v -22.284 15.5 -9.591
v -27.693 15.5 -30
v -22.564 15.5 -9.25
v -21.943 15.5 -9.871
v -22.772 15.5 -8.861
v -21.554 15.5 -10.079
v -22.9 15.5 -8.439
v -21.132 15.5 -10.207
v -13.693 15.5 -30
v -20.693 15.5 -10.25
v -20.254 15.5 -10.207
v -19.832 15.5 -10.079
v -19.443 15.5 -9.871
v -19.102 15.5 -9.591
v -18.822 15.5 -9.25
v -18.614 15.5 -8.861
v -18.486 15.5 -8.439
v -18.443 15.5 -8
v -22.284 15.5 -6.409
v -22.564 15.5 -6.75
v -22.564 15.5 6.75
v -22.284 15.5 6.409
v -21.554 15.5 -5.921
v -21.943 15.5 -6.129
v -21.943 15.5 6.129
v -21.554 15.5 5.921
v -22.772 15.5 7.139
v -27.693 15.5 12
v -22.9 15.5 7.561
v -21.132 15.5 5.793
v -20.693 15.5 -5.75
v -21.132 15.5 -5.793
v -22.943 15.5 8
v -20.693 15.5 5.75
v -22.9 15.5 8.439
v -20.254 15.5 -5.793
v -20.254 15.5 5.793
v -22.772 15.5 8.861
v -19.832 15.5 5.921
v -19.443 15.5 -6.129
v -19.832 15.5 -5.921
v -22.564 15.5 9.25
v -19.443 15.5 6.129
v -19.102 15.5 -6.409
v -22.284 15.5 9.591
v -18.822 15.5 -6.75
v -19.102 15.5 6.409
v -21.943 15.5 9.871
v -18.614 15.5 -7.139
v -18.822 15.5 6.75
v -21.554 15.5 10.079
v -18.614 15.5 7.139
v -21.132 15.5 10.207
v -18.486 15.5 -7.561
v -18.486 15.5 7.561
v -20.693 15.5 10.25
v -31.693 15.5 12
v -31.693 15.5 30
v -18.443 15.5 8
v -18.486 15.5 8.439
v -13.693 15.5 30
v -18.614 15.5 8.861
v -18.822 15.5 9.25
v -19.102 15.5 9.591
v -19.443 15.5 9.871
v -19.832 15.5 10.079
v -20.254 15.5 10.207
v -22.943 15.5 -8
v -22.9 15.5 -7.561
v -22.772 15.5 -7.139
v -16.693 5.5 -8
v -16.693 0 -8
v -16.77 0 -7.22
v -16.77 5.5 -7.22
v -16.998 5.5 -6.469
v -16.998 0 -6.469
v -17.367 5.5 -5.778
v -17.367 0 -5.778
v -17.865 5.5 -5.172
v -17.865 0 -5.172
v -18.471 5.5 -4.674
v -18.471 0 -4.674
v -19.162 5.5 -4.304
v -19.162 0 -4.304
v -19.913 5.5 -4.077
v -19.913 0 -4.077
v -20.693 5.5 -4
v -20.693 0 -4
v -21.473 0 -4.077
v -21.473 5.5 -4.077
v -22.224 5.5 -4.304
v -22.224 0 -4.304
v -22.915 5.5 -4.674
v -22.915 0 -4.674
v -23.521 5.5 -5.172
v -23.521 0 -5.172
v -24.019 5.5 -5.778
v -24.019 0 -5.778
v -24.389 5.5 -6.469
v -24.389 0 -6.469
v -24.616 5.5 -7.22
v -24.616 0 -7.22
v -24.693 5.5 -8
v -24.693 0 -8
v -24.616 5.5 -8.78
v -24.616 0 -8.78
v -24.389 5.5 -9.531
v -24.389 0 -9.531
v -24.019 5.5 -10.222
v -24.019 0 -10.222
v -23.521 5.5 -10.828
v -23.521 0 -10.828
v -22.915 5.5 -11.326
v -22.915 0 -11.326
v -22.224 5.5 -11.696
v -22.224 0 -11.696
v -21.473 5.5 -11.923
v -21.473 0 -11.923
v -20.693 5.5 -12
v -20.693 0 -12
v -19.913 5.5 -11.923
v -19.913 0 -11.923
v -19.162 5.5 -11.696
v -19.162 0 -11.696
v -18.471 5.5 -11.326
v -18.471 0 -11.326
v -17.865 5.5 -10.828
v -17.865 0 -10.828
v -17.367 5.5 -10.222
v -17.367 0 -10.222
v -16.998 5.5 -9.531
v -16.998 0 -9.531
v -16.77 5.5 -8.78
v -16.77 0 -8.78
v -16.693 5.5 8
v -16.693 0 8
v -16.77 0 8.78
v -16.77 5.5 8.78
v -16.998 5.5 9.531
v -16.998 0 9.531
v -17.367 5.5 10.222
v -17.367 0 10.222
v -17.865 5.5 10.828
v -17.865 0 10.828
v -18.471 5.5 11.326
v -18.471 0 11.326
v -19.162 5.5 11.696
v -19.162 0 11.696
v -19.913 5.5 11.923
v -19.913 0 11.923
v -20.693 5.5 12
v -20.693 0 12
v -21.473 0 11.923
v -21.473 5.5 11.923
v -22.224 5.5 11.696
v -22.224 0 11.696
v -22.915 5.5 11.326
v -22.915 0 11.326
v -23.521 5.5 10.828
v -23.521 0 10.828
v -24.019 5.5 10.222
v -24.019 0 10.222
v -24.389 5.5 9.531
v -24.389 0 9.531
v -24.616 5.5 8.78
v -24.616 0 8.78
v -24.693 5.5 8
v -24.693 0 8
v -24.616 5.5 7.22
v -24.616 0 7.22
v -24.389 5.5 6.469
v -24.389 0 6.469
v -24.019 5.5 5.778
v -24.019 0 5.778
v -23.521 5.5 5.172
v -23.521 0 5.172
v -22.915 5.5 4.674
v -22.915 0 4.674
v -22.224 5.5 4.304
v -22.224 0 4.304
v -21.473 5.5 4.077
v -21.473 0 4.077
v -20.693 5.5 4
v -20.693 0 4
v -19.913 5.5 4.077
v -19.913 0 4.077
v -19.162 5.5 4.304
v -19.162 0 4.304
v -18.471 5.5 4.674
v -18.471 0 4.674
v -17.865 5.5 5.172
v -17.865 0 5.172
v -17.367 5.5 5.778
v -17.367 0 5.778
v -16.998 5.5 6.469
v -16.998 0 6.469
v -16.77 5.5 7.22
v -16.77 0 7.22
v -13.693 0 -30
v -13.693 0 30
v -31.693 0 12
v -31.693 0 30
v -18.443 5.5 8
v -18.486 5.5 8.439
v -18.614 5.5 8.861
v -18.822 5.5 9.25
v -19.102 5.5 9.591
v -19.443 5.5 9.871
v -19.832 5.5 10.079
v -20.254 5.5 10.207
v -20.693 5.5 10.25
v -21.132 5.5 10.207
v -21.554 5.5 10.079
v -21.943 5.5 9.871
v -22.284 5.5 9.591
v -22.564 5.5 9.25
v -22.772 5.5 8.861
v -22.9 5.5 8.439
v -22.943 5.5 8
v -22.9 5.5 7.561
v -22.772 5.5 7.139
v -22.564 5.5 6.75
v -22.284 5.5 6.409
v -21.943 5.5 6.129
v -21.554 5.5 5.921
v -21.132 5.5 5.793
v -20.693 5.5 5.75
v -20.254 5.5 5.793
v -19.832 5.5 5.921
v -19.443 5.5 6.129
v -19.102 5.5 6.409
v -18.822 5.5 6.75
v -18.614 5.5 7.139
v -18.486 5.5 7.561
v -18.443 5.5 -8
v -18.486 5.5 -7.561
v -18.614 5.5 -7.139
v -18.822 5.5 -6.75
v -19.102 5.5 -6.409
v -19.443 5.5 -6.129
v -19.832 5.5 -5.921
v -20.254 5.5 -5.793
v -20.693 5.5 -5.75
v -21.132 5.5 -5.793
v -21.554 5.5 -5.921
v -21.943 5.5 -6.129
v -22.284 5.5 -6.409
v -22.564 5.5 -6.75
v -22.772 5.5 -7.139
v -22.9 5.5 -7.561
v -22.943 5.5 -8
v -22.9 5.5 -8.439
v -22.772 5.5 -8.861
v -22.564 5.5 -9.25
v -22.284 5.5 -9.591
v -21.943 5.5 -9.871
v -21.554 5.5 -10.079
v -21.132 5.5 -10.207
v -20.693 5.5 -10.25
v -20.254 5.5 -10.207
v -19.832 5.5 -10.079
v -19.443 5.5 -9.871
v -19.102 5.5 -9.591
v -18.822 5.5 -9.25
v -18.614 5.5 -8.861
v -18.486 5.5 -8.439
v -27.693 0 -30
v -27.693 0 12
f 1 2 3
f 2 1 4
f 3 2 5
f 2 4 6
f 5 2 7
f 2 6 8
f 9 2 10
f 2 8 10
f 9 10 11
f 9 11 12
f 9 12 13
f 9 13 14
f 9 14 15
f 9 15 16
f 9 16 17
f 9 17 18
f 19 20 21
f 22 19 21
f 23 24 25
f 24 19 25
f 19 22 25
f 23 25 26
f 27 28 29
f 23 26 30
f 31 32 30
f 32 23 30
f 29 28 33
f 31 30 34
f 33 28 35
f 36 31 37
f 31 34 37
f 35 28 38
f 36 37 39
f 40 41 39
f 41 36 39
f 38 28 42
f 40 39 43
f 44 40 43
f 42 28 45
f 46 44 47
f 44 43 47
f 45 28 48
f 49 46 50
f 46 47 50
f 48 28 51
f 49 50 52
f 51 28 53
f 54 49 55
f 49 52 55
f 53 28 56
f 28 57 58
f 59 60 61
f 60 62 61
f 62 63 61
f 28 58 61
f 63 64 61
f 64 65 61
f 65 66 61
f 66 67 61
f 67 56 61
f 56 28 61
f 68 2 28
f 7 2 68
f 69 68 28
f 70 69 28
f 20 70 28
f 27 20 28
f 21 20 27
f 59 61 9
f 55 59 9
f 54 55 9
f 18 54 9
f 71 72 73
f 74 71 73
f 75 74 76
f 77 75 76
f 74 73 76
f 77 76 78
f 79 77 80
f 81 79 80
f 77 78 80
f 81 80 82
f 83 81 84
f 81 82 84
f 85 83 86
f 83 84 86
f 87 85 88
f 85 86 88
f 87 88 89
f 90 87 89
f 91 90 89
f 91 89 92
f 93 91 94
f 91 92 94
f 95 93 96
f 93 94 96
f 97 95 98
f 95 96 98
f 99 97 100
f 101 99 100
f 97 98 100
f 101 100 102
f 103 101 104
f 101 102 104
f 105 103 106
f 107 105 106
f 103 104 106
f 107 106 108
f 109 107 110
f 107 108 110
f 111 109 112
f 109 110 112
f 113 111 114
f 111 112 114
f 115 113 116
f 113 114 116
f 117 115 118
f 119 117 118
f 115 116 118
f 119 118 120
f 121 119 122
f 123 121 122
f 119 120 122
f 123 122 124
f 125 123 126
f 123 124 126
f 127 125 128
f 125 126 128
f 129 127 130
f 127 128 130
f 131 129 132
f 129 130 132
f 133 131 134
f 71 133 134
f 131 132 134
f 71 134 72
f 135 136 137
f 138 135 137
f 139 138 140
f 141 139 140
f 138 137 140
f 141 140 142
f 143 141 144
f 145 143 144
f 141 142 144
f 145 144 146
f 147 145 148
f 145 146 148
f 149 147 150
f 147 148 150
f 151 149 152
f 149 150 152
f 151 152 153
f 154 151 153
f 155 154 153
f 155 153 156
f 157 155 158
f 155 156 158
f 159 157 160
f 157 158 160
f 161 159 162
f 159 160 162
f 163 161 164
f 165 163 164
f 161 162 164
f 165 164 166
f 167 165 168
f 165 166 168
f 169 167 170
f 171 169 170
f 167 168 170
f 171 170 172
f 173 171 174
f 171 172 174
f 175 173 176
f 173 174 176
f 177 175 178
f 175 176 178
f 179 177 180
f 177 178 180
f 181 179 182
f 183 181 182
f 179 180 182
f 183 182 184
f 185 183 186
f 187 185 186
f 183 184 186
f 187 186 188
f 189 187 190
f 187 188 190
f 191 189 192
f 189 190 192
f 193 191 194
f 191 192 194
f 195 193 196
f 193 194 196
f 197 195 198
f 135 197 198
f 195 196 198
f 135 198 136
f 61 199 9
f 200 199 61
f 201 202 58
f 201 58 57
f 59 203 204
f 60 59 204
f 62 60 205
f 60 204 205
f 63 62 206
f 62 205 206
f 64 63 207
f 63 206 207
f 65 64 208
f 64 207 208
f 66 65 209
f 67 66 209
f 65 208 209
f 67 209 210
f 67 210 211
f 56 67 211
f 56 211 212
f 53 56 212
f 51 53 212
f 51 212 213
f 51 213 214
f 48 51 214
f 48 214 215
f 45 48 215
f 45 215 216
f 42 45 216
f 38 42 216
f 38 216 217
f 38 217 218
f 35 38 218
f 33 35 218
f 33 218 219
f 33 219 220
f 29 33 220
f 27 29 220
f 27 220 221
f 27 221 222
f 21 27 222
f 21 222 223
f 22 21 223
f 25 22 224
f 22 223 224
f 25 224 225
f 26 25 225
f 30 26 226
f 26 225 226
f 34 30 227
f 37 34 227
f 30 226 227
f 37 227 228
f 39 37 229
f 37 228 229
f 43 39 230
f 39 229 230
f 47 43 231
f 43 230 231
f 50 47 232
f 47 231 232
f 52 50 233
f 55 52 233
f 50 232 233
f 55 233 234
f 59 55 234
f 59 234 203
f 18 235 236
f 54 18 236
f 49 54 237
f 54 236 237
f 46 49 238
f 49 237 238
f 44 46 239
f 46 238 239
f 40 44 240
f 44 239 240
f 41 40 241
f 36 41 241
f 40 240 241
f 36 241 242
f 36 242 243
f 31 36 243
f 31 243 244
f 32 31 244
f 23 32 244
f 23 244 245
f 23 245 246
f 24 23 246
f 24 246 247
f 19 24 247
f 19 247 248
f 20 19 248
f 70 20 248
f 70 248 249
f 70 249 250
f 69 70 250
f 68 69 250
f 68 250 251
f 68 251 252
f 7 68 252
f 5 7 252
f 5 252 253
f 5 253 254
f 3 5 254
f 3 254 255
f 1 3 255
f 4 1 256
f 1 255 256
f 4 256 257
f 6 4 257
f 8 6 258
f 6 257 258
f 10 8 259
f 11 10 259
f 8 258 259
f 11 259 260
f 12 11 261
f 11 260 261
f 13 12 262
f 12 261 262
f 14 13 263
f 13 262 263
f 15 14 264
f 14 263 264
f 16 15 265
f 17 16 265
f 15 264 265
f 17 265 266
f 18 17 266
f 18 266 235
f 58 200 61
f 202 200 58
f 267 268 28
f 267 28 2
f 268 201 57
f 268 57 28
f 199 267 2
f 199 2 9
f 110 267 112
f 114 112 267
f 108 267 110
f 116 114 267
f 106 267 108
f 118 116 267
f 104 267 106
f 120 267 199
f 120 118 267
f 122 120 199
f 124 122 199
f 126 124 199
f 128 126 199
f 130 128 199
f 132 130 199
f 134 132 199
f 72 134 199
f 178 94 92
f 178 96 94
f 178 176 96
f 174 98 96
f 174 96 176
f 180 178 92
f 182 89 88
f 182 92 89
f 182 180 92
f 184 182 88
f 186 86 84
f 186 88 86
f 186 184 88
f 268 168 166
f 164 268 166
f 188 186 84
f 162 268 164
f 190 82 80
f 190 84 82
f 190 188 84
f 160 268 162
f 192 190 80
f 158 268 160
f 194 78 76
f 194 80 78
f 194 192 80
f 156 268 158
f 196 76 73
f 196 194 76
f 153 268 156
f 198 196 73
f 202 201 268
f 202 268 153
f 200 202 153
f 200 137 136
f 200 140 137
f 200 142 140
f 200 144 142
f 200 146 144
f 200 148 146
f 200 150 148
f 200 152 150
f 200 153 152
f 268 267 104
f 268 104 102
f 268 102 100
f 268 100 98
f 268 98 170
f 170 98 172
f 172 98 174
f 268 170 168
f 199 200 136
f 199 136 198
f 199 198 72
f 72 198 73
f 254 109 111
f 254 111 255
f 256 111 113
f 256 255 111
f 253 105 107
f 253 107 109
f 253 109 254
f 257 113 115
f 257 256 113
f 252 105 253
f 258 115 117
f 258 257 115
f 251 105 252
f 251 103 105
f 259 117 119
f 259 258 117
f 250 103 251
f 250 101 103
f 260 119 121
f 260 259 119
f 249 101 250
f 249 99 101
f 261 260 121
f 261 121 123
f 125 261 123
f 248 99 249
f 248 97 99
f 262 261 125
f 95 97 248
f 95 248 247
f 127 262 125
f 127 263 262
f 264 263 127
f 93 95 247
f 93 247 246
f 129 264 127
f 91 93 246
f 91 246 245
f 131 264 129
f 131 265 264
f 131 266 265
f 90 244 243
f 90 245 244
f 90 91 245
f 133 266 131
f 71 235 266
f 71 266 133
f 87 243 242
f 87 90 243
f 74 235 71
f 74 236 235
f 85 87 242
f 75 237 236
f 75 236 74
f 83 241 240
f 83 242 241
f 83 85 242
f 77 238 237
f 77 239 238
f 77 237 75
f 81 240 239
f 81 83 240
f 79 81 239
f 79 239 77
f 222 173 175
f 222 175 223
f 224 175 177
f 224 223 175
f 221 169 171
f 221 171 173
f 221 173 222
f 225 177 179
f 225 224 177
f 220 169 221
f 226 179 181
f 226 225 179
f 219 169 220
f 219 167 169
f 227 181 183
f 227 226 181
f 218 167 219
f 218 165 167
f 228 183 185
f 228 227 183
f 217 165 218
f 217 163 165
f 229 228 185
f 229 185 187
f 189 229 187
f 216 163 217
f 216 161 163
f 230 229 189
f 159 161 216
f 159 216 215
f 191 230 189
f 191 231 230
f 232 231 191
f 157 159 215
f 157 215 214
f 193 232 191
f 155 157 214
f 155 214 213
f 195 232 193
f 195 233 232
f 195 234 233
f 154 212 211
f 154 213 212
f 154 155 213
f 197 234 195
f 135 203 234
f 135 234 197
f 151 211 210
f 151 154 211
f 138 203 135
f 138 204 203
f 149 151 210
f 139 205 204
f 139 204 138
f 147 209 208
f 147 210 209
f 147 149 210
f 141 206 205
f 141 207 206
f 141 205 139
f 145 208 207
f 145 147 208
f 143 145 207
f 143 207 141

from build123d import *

# Parameters (mm, degrees)
F0_R     = 4
F0_R_2   = 2.25
F0_W     = 1
F0_H     = 20
F1_DEPTH = 15.5
F2_DEPTH = 15.501
F3_DEPTH = 5.5


with BuildPart() as f1:
    # F0 (on Front) → F1 (new body)
    with BuildSketch(Plane.XZ):
        with BuildLine():
            Line((-31.693068, 12), (-27.693068, 12))
            Line((-27.693068, 12), (-27.693068, -10))
            Line((-27.693068, -10), (-26.693068, -10))
            Line((-26.693068, -10), (-26.693068, -30))
            Line((-26.693068, -30), (-22.693068, -30))
            Line((-22.693068, -30), (-22.693068, -18))
            ThreePointArc((-22.693068, -18), (-21.228602, -14.464466), (-17.693068, -13))
            Line((-17.693068, -13), (-13.693068, -13))
            Line((-13.693068, -13), (-13.693068, 30))
            Line((-13.693068, 30), (-31.693068, 30))
            Line((-31.693068, 30), (-31.693068, 12))
        make_face()
        with Locations((-20.693068, -8)):
            Circle(F0_R, mode=Mode.SUBTRACT)
        with Locations((-20.693068, 8)):
            Circle(F0_R, mode=Mode.SUBTRACT)
        with Locations((-20.693068, 8)):
            Circle(F0_R)
        with Locations((-20.693068, 8)):
            Circle(F0_R_2, mode=Mode.SUBTRACT)
        with Locations((-20.693068, -8)):
            Circle(F0_R)
        with Locations((-20.693068, -8)):
            Circle(F0_R_2, mode=Mode.SUBTRACT)
        with BuildLine():
            Line((-22.693068, -18), (-22.693068, -30))
            Line((-22.693068, -30), (-13.693068, -30))
            Line((-13.693068, -30), (-13.693068, -13))
            Line((-13.693068, -13), (-17.693068, -13))
            ThreePointArc((-17.693068, -13), (-21.228602, -14.464466), (-22.693068, -18))
        make_face()
        with Locations((-20.693068, 8)):
            Circle(F0_R_2)
        with Locations((-27.193068, -20)):
            Rectangle(F0_W, F0_H)
        with Locations((-20.693068, -8)):
            Circle(F0_R_2)
    extrude(amount=-F1_DEPTH)

    # F0 (on Front) → F2 (cut, through all)
    with BuildSketch(Plane.XZ):
        with Locations((-20.693068, 8)):
            Circle(F0_R_2)
        with Locations((-20.693068, -8)):
            Circle(F0_R_2)
    extrude(amount=-F2_DEPTH, mode=Mode.SUBTRACT)

    # F0 (on Front) → F3 (cut)
    with BuildSketch(Plane.XZ):
        with Locations((-20.693068, 8)):
            Circle(F0_R)
        with Locations((-20.693068, 8)):
            Circle(F0_R_2, mode=Mode.SUBTRACT)
        with Locations((-20.693068, -8)):
            Circle(F0_R)
        with Locations((-20.693068, -8)):
            Circle(F0_R_2, mode=Mode.SUBTRACT)
        with Locations((-20.693068, 8)):
            Circle(F0_R_2)
        with Locations((-20.693068, -8)):
            Circle(F0_R_2)
    extrude(amount=-F3_DEPTH, mode=Mode.SUBTRACT)


solid = f1.part
